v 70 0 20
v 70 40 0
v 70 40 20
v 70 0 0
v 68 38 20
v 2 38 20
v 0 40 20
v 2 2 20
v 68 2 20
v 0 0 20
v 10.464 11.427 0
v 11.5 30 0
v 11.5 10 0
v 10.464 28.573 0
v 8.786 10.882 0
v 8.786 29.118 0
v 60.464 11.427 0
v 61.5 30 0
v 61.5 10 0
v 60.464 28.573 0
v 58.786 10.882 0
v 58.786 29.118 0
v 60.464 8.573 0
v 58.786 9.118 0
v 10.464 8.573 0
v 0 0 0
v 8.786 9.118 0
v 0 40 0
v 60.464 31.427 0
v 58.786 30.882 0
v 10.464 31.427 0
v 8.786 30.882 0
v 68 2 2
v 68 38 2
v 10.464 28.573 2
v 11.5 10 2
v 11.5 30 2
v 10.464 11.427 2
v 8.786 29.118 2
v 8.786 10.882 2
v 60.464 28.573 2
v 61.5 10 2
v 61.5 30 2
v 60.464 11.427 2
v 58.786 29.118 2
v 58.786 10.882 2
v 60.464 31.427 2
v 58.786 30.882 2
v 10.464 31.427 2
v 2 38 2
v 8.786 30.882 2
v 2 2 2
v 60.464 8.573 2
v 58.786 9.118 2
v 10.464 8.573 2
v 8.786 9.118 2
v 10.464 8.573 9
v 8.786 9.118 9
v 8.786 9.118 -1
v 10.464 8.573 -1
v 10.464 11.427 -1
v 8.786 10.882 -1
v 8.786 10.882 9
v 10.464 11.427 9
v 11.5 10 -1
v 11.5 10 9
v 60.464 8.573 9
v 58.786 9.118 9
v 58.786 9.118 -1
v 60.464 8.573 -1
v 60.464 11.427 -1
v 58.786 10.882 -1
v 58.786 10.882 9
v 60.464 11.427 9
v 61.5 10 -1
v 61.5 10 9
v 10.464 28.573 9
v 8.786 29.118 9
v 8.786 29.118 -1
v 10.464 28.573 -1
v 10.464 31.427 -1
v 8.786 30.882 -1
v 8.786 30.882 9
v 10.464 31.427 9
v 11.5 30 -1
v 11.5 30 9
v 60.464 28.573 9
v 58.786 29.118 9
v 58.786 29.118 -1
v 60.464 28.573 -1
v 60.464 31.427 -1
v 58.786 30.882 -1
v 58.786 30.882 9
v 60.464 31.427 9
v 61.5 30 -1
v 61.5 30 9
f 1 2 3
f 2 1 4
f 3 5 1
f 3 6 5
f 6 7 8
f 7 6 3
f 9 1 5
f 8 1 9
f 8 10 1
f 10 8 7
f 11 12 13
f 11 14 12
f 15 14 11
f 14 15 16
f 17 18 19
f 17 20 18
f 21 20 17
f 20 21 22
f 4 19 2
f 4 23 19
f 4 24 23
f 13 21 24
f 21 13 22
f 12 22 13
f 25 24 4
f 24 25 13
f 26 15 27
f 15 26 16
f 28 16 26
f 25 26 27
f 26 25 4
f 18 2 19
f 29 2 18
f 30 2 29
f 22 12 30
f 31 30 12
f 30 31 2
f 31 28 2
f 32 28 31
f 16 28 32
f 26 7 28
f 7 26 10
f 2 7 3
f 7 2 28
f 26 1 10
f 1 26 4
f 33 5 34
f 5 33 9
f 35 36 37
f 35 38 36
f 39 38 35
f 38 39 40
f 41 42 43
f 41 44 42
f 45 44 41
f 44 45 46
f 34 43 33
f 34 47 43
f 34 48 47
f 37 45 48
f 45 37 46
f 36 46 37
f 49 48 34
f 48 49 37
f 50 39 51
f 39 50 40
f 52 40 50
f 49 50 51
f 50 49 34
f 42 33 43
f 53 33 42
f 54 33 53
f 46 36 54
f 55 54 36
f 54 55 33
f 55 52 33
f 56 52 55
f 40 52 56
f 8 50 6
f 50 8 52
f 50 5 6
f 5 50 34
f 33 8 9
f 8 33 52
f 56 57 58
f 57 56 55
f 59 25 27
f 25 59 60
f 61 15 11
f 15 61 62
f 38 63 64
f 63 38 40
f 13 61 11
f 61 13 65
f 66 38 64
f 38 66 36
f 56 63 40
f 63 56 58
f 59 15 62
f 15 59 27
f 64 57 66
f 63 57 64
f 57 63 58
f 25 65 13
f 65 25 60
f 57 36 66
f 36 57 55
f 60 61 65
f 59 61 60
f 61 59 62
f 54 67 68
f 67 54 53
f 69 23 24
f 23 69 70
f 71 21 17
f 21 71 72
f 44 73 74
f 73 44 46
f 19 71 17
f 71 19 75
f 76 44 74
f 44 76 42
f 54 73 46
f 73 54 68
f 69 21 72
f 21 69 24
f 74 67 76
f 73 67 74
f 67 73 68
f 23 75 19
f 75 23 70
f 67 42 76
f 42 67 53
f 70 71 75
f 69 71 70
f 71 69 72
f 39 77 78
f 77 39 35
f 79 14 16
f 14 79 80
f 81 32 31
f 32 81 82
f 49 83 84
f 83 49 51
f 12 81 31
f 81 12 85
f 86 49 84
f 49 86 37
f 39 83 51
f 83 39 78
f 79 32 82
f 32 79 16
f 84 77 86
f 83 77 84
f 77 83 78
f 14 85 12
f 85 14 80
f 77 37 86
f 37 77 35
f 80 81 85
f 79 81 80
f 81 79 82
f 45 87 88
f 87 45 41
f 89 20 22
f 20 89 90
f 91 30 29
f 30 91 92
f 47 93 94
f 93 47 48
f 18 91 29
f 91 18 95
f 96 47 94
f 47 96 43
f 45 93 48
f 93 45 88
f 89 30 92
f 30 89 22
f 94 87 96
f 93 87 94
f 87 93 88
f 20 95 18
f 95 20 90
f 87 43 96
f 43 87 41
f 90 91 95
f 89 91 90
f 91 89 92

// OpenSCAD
// GestureFly Glove Electronics Case
length=70;
width=40;
height=20;
wall=2;

difference(){
    cube([length,width,height]);
    translate([wall,wall,wall])
        cube([length-2*wall,width-2*wall,height]);
}

// screw holes
translate([10,10,-1]) cylinder(h=10,d=3);
translate([60,10,-1]) cylinder(h=10,d=3);
translate([10,30,-1]) cylinder(h=10,d=3);
translate([60,30,-1]) cylinder(h=10,d=3);
